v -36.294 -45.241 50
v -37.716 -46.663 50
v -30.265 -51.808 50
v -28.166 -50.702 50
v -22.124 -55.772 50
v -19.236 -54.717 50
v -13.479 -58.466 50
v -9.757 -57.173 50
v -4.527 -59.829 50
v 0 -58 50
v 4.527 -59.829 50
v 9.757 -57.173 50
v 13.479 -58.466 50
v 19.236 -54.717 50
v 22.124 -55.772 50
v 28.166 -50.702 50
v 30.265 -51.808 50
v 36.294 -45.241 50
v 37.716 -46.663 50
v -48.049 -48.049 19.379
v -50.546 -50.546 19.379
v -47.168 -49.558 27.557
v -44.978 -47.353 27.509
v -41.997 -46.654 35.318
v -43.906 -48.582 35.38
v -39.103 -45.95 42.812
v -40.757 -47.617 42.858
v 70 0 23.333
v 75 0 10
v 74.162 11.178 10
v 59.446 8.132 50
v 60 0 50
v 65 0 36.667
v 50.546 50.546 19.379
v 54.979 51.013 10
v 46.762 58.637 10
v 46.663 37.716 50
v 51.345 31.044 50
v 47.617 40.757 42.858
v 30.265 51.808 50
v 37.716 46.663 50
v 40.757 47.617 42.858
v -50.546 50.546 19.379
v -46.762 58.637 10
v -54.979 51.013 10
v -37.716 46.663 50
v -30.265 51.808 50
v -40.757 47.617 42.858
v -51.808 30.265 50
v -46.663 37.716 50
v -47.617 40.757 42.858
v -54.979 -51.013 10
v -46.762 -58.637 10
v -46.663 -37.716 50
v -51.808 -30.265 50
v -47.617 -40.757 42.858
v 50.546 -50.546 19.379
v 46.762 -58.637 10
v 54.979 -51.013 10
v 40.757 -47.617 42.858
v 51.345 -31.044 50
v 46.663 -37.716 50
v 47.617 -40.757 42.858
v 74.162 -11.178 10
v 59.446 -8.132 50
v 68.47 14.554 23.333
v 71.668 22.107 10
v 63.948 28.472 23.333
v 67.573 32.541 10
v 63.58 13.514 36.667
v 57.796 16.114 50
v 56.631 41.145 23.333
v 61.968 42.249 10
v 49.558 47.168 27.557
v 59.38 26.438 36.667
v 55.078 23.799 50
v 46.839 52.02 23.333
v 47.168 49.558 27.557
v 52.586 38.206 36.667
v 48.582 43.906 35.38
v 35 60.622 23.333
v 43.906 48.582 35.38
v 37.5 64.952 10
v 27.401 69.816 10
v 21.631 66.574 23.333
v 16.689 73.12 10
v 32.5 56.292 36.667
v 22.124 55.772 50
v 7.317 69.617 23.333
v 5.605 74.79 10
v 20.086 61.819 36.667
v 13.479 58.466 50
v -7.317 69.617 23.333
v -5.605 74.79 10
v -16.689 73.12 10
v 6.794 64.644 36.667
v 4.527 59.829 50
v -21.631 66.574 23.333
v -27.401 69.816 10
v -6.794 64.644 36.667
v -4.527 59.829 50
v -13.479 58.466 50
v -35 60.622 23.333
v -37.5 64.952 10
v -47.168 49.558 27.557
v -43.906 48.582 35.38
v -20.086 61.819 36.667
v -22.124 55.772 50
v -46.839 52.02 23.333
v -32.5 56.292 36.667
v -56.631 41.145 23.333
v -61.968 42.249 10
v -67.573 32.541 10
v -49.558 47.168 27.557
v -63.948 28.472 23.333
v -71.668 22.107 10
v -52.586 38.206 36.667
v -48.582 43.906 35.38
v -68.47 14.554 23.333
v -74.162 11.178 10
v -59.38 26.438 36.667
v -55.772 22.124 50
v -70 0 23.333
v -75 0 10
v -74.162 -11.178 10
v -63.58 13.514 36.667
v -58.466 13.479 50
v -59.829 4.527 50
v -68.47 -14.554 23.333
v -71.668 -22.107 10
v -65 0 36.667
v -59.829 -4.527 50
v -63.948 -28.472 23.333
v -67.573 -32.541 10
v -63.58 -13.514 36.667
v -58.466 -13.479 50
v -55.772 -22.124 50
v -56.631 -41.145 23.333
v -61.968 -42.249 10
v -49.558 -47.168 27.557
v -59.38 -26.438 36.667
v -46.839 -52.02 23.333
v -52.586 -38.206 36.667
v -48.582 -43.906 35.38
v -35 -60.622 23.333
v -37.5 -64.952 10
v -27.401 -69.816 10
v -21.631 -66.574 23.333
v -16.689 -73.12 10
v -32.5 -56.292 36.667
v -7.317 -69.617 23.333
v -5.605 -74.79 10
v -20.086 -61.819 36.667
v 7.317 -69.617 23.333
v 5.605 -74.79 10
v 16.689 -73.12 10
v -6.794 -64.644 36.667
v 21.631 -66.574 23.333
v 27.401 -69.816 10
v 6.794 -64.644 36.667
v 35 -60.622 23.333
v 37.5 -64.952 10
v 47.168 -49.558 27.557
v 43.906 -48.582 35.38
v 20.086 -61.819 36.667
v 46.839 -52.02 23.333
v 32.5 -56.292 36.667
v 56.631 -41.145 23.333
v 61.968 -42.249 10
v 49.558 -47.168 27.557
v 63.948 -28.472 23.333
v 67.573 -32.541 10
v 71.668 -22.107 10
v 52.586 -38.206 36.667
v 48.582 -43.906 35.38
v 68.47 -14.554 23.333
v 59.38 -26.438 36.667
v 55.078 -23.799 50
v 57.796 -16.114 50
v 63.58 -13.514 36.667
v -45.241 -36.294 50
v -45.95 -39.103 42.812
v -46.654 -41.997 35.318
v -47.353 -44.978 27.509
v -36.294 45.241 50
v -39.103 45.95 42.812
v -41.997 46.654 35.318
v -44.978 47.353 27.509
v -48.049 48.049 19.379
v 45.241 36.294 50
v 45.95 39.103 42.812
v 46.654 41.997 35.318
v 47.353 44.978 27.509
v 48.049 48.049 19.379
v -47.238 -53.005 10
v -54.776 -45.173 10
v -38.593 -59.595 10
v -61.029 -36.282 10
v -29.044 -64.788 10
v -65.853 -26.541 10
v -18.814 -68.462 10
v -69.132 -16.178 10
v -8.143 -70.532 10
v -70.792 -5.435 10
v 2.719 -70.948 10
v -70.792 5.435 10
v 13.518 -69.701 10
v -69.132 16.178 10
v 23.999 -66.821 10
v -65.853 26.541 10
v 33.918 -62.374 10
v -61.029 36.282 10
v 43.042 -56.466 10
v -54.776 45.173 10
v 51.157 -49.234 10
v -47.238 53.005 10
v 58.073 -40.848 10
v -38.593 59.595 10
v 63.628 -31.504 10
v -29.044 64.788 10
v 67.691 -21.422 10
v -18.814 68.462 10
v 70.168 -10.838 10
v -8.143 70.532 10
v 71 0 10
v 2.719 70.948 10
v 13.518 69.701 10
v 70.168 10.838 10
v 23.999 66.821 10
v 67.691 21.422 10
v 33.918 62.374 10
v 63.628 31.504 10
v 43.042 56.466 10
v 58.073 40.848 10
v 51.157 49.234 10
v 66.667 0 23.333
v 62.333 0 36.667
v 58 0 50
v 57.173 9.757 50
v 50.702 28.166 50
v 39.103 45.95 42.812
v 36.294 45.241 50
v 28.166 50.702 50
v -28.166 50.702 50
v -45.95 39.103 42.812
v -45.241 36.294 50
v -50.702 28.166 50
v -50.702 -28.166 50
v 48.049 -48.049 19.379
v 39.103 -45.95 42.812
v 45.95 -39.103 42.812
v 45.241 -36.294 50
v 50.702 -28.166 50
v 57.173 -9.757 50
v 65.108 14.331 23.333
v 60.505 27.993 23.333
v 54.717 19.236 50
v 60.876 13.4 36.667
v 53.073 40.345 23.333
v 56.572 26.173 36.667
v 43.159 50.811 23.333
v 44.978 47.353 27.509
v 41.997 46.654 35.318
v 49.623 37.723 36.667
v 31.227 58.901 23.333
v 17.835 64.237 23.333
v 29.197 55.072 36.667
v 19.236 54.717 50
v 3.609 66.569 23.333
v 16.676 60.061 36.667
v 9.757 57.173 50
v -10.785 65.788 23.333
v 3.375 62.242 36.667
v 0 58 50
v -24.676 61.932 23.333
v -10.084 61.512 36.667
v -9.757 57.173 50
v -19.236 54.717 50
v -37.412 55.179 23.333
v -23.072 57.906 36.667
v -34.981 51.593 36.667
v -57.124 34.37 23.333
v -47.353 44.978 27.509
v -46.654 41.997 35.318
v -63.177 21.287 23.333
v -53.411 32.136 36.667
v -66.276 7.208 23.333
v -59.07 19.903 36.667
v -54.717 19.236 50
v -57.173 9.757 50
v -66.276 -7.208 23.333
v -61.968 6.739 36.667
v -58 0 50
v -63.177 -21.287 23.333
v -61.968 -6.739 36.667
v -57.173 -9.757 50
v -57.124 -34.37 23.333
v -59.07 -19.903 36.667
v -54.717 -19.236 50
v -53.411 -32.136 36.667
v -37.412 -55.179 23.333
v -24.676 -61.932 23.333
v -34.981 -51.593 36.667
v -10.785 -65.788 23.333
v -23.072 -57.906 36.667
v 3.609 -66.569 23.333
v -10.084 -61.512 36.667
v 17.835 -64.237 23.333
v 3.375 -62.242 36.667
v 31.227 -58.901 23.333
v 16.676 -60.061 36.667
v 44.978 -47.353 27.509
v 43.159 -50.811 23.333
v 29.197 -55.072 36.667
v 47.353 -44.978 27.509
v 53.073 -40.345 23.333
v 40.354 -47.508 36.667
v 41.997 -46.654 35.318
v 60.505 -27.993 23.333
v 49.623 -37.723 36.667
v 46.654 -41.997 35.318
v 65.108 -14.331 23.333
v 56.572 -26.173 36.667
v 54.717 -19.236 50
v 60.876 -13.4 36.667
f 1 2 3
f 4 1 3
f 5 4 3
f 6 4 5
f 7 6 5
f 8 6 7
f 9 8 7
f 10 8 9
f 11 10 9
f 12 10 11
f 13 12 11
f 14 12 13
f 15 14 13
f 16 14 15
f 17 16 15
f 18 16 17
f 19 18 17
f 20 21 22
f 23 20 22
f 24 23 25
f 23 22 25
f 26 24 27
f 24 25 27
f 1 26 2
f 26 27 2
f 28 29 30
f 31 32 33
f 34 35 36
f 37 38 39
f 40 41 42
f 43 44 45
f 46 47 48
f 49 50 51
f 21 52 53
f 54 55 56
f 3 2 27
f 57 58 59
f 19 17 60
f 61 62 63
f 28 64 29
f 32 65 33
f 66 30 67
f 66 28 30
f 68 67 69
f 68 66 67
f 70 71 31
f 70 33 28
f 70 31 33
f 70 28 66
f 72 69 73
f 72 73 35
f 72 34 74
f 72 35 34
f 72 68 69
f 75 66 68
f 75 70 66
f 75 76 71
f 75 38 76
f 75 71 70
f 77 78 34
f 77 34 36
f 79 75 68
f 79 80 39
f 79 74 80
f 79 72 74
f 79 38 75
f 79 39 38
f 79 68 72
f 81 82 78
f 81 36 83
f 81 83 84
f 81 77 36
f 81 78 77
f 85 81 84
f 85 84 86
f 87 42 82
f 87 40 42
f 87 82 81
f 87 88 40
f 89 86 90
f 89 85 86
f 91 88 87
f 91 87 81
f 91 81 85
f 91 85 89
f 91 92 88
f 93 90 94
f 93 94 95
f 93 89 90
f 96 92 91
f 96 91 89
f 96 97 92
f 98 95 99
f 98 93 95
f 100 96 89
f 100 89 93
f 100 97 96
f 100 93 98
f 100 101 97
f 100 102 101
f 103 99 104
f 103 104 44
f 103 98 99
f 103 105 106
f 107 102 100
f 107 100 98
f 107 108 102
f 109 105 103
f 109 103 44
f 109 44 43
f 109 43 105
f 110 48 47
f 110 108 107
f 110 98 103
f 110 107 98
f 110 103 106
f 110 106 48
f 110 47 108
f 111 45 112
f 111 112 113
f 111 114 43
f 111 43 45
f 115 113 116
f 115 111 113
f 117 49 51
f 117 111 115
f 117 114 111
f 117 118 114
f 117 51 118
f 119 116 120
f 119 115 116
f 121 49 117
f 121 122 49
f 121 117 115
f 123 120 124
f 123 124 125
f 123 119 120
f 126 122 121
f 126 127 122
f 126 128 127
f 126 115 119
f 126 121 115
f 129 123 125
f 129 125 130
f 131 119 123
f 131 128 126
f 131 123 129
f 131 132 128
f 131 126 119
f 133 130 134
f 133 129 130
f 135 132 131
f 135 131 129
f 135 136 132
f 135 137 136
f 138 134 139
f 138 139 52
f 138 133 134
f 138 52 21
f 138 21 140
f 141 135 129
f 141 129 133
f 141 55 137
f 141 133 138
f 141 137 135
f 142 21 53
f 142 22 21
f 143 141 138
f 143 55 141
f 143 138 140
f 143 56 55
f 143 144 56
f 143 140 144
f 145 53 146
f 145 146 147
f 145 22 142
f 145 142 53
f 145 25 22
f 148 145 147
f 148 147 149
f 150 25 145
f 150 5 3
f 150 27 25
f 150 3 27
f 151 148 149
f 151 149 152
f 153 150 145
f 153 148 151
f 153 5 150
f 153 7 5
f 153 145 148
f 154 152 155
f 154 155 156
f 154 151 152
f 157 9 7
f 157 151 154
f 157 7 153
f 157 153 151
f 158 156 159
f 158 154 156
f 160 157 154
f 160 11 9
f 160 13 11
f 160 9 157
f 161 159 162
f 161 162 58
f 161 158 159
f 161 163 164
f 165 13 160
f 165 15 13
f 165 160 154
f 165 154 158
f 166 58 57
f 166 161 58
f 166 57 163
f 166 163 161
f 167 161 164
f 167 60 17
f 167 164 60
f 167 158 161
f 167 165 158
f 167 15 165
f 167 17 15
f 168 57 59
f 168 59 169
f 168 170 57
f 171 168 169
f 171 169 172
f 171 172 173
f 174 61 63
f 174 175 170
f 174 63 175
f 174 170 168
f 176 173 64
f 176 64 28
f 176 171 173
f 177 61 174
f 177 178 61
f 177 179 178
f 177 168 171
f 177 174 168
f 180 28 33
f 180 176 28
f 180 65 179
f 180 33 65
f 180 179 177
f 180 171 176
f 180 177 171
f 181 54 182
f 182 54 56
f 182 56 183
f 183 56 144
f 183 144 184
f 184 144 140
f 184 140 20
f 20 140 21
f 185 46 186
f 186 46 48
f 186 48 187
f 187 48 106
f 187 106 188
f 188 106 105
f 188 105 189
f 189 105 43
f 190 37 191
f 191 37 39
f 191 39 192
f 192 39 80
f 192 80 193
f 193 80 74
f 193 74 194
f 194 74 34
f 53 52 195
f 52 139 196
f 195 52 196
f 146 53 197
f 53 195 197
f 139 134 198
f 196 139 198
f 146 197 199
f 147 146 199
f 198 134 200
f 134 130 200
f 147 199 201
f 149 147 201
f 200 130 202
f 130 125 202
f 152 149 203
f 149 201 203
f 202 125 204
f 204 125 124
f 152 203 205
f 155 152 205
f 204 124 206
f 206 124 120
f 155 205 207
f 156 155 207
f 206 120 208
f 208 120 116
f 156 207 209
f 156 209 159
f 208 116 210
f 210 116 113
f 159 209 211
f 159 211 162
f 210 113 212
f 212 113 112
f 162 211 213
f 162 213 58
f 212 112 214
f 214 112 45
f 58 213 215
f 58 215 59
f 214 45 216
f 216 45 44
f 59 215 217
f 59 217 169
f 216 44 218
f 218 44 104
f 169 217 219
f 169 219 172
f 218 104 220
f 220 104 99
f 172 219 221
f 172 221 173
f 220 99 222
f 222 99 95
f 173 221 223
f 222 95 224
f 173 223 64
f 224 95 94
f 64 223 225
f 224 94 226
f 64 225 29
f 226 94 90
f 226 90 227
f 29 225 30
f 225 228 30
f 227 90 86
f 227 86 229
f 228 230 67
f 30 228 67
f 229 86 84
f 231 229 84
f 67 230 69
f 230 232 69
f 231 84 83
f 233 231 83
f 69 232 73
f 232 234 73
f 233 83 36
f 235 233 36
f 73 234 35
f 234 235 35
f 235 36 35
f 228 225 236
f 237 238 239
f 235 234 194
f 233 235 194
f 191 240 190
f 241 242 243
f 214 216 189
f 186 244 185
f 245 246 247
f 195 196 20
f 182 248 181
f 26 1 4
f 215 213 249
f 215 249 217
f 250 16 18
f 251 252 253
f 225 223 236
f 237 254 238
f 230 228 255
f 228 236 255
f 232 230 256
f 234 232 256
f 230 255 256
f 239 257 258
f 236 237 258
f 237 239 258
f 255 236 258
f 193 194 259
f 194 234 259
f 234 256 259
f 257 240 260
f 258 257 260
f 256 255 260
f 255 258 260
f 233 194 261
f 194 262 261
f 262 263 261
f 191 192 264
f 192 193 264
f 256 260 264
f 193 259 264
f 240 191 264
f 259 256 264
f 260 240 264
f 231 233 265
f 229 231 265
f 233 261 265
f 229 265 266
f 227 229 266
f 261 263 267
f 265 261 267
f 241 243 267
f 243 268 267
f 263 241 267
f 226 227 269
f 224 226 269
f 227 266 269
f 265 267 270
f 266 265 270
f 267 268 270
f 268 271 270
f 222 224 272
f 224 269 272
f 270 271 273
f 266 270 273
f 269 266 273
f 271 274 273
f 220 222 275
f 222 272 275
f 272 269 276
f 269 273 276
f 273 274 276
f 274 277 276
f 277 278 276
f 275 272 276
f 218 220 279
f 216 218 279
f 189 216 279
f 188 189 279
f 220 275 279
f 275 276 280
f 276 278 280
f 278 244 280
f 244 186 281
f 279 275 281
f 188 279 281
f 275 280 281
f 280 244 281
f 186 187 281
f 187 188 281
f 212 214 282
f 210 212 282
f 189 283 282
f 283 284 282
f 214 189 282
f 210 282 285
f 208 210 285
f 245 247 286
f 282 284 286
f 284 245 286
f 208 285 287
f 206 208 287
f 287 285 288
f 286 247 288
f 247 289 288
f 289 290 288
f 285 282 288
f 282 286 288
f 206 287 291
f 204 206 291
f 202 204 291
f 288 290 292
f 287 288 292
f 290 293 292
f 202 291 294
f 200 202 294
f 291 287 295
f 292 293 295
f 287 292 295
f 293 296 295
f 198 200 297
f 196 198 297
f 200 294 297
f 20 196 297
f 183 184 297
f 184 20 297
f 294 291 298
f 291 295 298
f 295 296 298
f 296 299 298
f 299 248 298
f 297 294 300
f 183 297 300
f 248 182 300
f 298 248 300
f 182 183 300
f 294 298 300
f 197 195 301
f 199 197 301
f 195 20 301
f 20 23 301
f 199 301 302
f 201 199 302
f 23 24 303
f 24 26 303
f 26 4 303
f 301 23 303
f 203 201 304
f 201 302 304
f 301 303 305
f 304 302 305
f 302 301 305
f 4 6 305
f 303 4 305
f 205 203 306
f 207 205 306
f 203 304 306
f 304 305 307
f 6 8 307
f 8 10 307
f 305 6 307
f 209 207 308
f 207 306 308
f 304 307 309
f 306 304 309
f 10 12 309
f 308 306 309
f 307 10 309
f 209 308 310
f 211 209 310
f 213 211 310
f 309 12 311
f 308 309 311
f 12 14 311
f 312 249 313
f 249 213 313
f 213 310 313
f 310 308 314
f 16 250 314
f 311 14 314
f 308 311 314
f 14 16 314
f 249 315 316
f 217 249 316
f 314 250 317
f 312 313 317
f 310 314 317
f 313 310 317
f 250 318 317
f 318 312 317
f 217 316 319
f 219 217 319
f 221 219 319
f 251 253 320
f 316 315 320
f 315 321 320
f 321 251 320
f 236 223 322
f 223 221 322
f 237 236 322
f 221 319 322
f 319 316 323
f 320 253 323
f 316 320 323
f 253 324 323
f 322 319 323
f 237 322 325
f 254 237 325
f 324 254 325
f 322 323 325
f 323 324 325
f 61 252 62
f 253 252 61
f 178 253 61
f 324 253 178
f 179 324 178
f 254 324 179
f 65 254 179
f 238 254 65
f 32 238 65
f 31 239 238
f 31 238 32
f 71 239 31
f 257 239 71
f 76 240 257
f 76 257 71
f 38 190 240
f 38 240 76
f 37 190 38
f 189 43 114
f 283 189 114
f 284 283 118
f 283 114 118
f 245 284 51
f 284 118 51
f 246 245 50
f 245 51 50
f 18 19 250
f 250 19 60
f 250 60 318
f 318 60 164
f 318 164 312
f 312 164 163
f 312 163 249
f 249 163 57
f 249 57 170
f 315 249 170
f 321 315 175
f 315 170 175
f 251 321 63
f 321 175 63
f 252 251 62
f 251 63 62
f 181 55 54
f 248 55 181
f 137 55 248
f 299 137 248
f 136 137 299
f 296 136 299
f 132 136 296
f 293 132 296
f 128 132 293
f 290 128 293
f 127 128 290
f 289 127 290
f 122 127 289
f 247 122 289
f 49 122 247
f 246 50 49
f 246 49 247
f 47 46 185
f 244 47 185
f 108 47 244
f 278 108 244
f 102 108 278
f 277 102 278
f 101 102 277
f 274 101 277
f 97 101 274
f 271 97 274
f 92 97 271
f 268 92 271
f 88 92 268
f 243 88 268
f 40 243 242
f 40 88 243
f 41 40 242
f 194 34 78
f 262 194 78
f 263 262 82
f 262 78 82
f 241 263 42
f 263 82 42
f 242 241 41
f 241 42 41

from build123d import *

# Parameters (mm, degrees)
SKETCH027_R           = 71
SKETCH028_R           = 58
SKETCH025_R           = 75
SKETCH026_R           = 60
POCKET005_DEPTH       = 31
POLARPATTERN007_COUNT = 4


with BuildPart() as loft001:
    # Sketch027 → Loft001 section 0
    with BuildSketch(Plane.XY.offset(10)):
        Circle(SKETCH027_R)
    # Sketch028 → Loft001 section 1
    with BuildSketch(Plane.XY.offset(50)):
        Circle(SKETCH028_R)
    loft()


with BuildPart() as support:
    # Sketch025 → Loft section 0
    with BuildSketch(Plane.XY.offset(10)):
        Circle(SKETCH025_R)
    # Sketch026 → Loft section 1
    with BuildSketch(Plane.XY.offset(50)):
        Circle(SKETCH026_R)
    loft()

    # Cut: cut Loft001
    add(loft001.part, mode=Mode.SUBTRACT)

    # Sketch029 → Pocket005 (cut)
    with BuildSketch(Plane(origin=(-60, -60, 0), x_dir=(-0.707107, 0.707107, 0), z_dir=(0.707107, 0.707107, 0))):
        Polygon((9.467248, 65.201898), (0, 19.378601), (-9.467248, 65.201898), align=None)
    pocket005 = extrude(amount=POCKET005_DEPTH, mode=Mode.SUBTRACT)

    # PolarPattern007: Pocket005 ×4 about axis
    polarpattern007_axis = Axis((0, 0, 0), (0, 0, 1))
    for i in range(1, POLARPATTERN007_COUNT):
        add(pocket005.rotate(polarpattern007_axis, i * 360 / POLARPATTERN007_COUNT), mode=Mode.SUBTRACT)


solid = support.part
